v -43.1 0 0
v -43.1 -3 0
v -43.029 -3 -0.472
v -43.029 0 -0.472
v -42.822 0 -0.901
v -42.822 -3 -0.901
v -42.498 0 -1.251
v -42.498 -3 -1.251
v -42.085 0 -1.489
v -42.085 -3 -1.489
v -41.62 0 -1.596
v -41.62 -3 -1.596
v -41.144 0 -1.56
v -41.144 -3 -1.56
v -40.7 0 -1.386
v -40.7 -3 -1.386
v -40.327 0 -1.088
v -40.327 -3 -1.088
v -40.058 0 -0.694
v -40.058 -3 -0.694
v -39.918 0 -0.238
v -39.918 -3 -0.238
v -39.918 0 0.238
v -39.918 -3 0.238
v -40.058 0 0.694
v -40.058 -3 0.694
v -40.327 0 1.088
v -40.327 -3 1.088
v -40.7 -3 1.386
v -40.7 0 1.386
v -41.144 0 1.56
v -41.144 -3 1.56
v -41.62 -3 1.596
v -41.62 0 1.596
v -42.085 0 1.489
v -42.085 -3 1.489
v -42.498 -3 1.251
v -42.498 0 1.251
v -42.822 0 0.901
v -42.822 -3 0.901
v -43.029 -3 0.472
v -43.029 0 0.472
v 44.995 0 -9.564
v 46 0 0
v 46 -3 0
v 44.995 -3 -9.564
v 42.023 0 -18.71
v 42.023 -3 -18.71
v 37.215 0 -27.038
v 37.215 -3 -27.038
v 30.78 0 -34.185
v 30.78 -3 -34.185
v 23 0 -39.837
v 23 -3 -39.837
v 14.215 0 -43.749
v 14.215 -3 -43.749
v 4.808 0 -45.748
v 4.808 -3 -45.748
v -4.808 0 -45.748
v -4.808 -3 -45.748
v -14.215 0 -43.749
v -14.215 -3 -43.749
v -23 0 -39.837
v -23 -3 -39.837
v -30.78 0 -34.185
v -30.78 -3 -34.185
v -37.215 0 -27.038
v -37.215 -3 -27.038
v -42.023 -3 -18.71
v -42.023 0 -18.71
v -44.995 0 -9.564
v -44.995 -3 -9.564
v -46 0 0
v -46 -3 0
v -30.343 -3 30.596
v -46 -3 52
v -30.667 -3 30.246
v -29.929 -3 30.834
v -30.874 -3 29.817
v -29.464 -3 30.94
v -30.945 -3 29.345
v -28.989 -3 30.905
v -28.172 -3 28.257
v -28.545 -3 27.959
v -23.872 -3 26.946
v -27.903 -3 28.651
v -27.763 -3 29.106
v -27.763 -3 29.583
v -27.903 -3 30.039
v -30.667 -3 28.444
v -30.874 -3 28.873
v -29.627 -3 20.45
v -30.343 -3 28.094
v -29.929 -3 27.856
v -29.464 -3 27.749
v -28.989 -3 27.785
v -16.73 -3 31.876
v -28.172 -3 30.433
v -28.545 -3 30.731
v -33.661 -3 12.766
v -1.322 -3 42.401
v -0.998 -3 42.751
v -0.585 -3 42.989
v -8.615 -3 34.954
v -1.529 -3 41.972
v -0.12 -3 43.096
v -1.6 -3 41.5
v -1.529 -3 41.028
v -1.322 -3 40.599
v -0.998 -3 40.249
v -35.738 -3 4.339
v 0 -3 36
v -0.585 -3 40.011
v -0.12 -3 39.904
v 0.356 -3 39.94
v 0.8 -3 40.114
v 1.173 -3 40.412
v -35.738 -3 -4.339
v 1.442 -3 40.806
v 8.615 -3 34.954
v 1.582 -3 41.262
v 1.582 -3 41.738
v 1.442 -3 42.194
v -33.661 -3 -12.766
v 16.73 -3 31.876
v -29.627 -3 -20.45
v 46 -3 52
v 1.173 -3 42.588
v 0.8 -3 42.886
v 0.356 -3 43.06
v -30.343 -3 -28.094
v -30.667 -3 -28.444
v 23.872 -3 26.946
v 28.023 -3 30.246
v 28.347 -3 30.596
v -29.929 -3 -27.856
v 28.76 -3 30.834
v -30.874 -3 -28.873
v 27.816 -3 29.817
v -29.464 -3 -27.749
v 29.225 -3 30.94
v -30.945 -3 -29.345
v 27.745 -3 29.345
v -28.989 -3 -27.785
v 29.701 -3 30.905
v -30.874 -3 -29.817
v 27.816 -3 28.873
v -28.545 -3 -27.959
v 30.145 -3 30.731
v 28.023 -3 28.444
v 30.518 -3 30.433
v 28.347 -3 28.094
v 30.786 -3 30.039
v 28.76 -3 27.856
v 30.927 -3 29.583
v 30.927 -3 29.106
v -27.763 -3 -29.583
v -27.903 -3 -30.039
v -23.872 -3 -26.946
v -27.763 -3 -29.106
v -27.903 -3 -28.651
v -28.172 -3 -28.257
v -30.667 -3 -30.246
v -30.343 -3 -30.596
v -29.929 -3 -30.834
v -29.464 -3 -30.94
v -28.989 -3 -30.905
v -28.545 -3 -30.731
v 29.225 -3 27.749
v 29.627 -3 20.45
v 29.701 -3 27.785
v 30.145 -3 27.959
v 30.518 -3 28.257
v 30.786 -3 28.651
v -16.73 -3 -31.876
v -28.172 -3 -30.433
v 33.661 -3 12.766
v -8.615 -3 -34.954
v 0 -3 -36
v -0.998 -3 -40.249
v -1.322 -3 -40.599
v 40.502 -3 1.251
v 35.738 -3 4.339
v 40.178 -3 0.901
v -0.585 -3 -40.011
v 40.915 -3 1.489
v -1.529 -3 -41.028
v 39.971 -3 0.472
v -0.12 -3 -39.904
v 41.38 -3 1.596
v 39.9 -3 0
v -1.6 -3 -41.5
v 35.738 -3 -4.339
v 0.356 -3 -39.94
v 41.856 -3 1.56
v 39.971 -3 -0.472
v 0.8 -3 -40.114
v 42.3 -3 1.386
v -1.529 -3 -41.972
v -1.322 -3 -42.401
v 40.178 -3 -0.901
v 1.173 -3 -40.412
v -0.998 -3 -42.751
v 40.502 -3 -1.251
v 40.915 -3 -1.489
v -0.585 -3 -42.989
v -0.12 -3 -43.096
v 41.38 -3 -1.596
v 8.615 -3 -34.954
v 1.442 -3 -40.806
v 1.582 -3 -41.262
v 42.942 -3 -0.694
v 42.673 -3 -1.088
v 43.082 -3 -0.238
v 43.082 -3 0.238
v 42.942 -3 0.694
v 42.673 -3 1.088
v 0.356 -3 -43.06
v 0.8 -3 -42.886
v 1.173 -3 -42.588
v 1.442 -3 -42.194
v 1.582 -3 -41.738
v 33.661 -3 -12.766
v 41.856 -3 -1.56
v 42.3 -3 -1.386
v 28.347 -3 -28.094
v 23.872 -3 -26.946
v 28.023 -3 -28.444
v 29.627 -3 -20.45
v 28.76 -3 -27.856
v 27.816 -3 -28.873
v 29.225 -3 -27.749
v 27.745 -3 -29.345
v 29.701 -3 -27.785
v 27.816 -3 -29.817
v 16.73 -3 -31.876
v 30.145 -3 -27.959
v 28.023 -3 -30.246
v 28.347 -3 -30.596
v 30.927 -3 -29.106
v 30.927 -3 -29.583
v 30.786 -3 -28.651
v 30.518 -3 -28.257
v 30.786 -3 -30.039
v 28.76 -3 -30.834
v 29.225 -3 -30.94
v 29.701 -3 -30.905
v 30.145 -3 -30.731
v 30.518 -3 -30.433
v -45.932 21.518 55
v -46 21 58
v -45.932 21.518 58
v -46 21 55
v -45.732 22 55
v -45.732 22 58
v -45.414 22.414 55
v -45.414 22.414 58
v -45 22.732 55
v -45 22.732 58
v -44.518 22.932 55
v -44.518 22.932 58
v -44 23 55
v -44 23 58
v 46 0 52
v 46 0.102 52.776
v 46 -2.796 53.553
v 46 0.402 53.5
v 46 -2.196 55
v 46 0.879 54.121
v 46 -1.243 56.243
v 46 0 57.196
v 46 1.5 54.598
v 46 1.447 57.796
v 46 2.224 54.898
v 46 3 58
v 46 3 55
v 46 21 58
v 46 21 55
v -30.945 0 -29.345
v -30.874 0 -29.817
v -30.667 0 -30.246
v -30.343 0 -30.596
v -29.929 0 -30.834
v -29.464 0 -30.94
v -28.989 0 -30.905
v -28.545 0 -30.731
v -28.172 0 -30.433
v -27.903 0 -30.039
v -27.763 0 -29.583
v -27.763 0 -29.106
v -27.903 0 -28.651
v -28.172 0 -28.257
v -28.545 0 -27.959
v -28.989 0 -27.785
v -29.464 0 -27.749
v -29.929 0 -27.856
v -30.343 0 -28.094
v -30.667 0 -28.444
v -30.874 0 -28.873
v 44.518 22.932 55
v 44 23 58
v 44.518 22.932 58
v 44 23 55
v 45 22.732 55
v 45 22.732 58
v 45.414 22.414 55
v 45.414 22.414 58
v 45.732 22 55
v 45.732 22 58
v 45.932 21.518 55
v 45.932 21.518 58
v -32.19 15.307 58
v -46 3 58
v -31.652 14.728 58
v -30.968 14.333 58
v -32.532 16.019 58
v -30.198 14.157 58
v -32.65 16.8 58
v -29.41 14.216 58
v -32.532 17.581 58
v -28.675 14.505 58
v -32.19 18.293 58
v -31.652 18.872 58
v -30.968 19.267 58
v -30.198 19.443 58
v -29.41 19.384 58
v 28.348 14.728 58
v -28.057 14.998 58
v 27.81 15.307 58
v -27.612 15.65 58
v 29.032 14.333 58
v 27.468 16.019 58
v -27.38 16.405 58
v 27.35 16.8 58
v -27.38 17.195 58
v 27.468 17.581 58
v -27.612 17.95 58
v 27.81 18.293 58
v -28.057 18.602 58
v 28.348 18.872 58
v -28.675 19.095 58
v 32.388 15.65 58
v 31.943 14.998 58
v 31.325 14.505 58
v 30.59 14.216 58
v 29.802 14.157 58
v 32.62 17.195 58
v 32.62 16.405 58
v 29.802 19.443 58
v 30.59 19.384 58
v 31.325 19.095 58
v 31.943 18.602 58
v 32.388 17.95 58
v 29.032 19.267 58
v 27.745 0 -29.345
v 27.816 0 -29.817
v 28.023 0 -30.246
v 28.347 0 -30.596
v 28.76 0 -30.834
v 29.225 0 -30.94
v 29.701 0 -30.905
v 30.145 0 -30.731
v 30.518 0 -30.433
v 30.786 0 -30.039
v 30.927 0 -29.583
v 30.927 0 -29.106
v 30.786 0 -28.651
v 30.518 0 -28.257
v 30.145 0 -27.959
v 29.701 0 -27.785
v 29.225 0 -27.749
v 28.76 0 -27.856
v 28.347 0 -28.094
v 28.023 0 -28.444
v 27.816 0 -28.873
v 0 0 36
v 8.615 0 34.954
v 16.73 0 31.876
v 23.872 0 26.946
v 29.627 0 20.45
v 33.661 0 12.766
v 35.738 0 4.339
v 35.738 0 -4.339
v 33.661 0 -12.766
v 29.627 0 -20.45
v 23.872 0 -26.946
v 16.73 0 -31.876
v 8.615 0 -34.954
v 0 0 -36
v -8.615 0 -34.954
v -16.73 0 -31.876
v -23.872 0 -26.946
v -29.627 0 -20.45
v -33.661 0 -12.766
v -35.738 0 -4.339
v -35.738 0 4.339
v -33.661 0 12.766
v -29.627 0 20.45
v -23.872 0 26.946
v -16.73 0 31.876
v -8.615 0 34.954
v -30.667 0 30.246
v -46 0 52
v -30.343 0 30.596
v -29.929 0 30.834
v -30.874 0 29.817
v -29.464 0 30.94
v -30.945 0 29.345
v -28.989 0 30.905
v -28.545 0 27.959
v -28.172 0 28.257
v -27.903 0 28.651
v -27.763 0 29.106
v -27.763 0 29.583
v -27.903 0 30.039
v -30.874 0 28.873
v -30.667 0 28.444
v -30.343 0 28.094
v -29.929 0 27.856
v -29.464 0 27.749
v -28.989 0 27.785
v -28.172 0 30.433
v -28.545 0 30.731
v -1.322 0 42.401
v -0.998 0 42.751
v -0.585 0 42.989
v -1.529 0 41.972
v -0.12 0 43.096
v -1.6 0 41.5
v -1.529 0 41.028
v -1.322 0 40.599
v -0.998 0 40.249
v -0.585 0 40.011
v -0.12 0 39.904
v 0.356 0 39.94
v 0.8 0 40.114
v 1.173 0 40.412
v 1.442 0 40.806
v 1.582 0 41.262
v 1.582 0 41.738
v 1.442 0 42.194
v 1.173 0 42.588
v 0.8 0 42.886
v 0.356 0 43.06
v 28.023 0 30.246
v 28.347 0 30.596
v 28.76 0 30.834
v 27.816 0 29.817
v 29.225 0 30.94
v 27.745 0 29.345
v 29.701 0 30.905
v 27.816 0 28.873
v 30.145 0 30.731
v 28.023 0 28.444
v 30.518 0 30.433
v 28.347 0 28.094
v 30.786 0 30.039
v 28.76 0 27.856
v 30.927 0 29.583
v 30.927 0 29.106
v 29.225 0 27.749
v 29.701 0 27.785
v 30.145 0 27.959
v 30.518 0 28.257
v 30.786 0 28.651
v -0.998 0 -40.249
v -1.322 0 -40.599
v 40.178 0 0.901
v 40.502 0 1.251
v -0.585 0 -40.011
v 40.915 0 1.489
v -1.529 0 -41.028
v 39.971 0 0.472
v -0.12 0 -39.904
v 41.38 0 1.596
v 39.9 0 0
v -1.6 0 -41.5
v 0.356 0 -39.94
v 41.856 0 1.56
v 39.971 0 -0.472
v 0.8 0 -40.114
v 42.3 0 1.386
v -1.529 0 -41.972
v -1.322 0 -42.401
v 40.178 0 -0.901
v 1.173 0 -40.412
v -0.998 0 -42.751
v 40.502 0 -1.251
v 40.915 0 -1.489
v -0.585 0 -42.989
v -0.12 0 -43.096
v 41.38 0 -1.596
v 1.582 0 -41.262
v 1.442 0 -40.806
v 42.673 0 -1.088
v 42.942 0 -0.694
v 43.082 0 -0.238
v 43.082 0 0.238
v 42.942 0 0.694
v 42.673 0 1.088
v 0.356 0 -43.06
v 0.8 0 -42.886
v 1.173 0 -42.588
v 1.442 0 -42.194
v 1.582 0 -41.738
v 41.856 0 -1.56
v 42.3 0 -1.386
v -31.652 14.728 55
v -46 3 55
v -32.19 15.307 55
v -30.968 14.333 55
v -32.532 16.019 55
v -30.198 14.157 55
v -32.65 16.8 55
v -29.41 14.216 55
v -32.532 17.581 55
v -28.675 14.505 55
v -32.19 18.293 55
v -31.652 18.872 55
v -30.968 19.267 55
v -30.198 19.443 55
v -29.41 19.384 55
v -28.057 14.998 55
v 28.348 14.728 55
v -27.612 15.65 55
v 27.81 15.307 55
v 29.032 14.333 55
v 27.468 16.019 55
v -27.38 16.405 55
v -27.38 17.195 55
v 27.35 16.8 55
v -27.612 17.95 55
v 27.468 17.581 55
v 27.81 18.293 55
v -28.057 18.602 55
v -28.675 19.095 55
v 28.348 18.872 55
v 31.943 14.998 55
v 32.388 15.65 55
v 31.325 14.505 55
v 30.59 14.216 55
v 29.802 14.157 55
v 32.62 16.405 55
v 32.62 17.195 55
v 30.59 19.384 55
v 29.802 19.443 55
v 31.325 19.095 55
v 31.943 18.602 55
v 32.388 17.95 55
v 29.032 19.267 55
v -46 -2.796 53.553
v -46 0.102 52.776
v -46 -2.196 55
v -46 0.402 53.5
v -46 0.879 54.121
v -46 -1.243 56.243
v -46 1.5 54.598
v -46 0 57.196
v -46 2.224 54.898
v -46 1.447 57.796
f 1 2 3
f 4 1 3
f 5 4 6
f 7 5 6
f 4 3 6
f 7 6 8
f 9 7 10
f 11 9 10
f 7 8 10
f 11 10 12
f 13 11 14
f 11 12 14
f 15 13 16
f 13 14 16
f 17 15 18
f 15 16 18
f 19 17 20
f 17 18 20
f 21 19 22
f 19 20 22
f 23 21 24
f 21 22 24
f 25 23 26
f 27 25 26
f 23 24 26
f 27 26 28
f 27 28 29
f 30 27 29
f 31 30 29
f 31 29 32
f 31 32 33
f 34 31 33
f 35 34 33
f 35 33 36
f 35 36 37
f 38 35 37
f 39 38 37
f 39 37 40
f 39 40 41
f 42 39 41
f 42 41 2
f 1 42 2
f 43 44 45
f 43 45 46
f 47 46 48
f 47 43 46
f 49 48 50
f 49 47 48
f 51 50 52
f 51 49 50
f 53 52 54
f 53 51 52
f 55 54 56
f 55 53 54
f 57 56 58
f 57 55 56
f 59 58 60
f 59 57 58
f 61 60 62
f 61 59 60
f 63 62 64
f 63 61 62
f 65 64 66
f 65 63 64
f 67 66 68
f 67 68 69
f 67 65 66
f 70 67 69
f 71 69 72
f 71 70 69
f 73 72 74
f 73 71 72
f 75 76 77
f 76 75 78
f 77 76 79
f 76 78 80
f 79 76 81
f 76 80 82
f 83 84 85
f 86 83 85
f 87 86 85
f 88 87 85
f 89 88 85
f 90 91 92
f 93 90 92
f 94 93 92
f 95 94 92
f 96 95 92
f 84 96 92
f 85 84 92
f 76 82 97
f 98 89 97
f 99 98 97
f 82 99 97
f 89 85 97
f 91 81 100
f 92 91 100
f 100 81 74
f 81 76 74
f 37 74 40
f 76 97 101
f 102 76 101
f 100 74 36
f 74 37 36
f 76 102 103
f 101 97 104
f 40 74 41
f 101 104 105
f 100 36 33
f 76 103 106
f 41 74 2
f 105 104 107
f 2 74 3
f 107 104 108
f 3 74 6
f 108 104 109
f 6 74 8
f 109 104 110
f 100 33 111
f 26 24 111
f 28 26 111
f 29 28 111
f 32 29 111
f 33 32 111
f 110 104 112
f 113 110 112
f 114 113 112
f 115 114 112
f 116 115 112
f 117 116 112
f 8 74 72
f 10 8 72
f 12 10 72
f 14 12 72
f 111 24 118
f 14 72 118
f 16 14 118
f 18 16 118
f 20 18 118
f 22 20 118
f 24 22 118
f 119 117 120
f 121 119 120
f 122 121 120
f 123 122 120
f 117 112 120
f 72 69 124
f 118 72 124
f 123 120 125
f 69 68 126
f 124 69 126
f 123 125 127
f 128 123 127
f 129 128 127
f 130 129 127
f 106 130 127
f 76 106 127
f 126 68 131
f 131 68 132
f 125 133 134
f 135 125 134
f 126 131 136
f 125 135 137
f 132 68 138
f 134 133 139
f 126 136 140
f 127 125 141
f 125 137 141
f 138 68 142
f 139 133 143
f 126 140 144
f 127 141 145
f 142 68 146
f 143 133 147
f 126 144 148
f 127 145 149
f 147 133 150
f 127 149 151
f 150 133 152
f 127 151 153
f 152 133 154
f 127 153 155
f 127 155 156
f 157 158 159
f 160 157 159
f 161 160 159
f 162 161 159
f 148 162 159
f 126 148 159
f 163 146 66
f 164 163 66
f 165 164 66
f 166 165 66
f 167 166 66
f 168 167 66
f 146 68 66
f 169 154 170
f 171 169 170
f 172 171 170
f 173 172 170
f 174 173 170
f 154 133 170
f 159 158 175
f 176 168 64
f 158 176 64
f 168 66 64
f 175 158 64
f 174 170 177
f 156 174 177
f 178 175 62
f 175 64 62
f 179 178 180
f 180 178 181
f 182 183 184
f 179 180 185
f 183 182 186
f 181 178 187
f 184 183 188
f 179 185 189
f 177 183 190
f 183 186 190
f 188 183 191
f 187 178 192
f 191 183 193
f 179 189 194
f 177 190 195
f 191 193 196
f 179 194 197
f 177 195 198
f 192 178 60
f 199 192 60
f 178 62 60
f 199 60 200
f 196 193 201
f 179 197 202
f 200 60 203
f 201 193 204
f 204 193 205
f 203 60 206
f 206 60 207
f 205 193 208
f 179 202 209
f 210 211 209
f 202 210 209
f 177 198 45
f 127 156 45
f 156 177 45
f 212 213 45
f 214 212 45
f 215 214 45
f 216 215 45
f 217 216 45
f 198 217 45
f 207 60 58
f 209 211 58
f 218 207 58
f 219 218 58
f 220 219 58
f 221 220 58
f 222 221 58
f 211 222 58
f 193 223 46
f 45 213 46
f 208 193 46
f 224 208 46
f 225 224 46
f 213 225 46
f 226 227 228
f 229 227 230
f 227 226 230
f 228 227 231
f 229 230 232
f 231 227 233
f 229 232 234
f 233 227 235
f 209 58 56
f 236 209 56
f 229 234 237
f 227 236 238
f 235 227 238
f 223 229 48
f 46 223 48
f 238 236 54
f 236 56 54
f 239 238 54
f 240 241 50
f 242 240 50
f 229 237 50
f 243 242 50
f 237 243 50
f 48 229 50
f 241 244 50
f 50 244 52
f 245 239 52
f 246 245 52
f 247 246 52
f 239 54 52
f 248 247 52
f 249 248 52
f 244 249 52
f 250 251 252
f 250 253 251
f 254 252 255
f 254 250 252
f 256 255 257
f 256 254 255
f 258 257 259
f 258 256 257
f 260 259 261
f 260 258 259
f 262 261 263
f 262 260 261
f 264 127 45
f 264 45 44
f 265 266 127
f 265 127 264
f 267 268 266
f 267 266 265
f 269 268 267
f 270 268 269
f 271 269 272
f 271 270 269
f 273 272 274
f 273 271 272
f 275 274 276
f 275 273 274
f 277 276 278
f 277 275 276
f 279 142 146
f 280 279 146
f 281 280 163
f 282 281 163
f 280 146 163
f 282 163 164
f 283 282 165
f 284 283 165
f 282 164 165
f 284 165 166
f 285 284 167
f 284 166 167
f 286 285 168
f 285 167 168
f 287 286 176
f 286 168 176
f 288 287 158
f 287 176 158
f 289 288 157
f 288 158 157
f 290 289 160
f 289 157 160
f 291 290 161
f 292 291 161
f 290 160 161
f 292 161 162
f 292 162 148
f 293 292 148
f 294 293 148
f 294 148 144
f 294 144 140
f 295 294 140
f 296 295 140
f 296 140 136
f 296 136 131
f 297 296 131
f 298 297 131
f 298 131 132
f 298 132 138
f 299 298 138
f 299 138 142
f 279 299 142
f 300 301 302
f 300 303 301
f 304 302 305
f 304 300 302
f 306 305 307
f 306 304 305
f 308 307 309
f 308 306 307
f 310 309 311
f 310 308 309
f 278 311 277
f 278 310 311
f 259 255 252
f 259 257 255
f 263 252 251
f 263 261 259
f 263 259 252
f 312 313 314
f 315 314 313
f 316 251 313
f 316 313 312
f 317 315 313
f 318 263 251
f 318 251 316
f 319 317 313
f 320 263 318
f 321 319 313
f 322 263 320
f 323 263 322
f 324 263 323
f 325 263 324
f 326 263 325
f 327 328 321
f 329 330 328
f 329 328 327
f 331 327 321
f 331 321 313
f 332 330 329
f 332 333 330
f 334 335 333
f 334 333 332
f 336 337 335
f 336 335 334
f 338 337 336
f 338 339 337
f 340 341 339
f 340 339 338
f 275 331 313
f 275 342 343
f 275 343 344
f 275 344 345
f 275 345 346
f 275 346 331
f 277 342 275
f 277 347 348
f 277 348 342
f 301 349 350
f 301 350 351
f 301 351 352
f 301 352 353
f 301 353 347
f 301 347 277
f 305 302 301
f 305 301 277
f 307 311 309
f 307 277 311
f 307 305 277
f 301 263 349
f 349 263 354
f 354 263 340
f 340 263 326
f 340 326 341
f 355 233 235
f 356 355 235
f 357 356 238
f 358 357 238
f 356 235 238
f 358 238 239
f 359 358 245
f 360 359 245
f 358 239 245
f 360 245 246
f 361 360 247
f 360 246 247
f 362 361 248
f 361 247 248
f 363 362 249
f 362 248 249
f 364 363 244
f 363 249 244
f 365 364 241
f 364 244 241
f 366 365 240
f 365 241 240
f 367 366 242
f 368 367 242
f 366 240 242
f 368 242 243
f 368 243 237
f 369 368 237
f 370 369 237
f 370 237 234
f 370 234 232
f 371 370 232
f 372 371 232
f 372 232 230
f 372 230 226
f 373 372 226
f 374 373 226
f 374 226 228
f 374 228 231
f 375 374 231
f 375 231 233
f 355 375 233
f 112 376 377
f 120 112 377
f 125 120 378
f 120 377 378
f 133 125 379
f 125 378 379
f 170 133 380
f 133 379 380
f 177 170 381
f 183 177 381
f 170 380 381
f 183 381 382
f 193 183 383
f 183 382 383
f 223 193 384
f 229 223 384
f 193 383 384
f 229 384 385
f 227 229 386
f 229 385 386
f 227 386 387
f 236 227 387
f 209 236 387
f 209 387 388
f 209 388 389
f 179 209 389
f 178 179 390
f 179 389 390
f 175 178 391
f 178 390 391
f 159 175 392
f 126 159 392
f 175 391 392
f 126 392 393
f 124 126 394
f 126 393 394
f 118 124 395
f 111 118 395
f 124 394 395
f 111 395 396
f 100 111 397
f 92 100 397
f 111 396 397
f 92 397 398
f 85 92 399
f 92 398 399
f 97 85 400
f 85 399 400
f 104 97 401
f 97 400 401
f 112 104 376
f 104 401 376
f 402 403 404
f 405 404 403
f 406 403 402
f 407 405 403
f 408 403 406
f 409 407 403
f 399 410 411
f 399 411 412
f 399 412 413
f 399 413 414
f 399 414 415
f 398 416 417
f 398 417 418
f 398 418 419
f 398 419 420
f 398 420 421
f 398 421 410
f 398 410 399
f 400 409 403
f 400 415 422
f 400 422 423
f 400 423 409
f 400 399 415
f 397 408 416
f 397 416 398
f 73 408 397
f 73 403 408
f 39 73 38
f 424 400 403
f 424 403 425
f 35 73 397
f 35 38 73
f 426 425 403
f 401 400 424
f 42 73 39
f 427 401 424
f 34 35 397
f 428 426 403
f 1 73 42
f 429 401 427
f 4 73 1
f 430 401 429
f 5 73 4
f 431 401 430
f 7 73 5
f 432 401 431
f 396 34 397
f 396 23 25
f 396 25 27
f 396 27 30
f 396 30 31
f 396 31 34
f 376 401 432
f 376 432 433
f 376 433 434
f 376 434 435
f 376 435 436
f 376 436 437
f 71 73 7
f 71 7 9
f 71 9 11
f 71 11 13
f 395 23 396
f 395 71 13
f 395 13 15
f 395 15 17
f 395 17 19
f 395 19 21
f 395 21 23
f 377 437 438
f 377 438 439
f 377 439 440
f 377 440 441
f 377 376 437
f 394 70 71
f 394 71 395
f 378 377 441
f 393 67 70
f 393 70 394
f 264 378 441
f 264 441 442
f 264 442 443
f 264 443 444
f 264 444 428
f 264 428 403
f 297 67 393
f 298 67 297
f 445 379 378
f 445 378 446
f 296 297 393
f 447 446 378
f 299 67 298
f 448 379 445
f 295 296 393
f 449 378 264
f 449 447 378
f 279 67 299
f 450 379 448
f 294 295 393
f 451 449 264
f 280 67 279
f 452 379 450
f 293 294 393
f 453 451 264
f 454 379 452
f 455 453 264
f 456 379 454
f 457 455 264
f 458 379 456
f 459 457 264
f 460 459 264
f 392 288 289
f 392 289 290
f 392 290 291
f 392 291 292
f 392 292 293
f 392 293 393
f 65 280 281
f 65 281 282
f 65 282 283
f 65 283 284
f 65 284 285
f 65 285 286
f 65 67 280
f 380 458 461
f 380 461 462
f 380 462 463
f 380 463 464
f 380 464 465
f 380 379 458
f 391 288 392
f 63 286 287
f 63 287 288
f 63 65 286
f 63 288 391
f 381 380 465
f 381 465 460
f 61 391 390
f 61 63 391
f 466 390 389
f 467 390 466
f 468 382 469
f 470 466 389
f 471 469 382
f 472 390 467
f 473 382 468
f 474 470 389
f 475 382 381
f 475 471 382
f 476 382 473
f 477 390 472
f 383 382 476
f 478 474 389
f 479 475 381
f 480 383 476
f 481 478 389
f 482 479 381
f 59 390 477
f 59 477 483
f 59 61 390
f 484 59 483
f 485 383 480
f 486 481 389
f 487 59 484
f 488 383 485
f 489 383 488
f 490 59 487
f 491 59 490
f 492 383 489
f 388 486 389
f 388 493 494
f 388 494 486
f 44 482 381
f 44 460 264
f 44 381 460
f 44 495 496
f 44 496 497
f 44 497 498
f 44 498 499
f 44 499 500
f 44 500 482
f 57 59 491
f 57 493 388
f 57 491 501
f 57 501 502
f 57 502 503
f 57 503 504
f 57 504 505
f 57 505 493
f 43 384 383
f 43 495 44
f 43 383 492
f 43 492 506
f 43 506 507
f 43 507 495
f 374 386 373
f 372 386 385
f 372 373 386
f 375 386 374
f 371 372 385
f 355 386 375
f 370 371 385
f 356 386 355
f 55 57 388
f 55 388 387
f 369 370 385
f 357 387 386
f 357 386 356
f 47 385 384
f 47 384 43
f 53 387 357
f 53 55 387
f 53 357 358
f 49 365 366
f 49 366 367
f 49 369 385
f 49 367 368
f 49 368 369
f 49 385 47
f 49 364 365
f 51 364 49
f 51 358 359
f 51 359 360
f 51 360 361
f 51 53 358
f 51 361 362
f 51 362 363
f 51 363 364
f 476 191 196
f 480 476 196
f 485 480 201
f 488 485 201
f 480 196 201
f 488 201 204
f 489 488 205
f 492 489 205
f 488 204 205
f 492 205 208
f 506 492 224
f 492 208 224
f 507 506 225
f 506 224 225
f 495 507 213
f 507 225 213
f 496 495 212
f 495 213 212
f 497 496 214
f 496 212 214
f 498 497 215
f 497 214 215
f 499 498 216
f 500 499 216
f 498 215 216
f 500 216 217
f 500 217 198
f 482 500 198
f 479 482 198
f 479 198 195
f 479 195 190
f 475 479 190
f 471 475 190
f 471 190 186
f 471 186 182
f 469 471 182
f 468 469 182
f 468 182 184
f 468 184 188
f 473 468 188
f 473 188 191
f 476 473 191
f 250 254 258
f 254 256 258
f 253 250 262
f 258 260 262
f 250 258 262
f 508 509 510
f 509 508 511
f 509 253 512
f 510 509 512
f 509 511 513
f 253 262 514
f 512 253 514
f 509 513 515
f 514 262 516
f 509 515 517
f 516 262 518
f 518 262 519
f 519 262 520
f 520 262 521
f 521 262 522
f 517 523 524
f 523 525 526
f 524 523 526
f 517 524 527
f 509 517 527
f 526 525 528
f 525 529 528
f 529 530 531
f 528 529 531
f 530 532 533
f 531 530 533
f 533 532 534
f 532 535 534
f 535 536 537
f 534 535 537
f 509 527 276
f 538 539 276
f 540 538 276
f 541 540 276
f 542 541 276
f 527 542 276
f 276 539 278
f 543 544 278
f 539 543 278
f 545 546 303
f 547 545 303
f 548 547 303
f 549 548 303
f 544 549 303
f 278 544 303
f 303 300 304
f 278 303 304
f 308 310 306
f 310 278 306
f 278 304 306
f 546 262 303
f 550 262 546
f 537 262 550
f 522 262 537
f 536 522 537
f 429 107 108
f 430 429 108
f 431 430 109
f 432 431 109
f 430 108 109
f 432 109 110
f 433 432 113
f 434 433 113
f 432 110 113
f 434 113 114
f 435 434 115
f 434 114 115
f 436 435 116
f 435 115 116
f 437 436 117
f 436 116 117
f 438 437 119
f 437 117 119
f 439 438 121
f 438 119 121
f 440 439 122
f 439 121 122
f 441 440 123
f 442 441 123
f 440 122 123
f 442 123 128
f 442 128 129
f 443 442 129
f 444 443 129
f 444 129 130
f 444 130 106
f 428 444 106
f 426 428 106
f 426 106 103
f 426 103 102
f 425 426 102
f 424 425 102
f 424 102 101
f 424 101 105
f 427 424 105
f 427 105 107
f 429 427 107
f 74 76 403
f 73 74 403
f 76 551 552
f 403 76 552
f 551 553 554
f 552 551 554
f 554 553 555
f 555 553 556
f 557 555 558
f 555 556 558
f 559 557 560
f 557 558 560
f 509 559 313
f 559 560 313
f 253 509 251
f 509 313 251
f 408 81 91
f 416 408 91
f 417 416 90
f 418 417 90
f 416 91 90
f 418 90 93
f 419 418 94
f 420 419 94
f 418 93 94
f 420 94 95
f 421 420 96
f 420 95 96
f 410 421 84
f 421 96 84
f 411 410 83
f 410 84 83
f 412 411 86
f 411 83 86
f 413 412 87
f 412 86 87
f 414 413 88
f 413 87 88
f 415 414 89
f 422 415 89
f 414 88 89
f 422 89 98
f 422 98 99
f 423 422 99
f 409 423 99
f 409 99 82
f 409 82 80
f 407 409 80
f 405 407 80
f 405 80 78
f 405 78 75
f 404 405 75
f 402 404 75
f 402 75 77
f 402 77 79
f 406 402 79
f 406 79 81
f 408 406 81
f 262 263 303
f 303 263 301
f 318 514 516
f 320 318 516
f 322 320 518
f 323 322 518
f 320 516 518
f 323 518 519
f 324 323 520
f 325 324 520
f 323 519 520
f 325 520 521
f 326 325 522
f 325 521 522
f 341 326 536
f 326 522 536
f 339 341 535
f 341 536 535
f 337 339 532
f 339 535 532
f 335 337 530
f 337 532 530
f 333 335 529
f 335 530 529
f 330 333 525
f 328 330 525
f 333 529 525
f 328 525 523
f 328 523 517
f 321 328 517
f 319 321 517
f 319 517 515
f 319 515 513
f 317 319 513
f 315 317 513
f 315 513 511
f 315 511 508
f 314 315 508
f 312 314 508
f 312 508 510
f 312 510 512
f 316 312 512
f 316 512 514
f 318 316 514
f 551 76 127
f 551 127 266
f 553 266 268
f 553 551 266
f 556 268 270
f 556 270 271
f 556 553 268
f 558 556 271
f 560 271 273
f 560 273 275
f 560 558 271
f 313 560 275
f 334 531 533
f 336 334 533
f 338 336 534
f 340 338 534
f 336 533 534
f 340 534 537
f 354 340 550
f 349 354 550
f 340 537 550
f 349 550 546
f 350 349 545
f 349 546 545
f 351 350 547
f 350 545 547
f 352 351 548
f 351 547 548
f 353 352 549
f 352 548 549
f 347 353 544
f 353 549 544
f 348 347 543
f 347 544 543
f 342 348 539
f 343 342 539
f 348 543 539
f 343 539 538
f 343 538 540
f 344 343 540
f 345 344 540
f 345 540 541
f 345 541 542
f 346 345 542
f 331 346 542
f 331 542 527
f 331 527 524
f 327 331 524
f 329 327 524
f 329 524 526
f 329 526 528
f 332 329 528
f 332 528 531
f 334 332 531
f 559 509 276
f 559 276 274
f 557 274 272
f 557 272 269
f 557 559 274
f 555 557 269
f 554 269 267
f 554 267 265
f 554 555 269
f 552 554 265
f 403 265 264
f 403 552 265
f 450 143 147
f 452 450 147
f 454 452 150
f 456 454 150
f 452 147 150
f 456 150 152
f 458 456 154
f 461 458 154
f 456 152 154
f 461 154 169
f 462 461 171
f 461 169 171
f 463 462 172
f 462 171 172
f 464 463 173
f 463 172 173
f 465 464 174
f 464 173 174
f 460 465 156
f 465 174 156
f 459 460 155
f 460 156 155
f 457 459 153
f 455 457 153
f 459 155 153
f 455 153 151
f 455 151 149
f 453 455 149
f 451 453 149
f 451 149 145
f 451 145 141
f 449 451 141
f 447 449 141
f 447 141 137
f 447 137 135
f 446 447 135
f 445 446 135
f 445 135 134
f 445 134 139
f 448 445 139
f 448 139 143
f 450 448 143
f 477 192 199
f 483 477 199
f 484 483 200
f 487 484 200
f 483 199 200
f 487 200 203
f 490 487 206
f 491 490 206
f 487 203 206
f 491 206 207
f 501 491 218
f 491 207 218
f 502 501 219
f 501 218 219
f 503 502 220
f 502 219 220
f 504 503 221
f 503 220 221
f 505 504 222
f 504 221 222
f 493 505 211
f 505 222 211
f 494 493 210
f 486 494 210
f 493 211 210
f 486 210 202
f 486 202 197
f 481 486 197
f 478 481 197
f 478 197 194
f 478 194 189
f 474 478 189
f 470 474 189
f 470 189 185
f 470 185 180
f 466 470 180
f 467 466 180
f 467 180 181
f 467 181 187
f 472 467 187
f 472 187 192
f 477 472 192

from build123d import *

# Parameters (mm, degrees)
SKETCH1_R                    = 36
SKETCH1_R_2                  = 1
BASE_FLANGE1_DEPTH           = 3
EDGE_FLANGE1_STRIP_W         = 18
EDGE_FLANGE1_STRIP_H         = 3
EDGE_FLANGE1_STRIP_CUT_DEPTH = 92
EDGE_FLANGE1_DEPTH           = 92
EDGE_FLANGE1_START           = 3
EDGE_FLANGE1_PROFILE_W       = 92
EDGE_FLANGE1_PROFILE_H       = 20
EDGE_FLANGE1_PROFILE_R       = 1
EDGE_FLANGE1_FLAT_DEPTH      = 3
FILLET1_R                    = 2
M3_CLEARANCE_HOLE1_D         = 3.2
M3_CLEARANCE_HOLE1_DEPTH     = 136
M3_CLEARANCE_HOLE1_TIP       = 0.96137699
M5_CLEARANCE_HOLE1_D         = 5.3
M5_CLEARANCE_HOLE1_DEPTH     = 136
M5_CLEARANCE_HOLE1_TIP       = 1.59228064


# Sheet-metal steps are written as plain solids
with BuildPart() as part:
    # Sketch1 → Base-Flange1 (new body)
    with BuildSketch(Plane(origin=(0, 0, 0), x_dir=(1, 0, 0), z_dir=(0, 1, 0))):
        with BuildLine():
            Line((-46, 0), (-46, -55))
            Line((-46, -55), (46, -55))
            Line((46, -55), (46, 0))
            ThreePointArc((46, 0), (0, 46), (-46, 0))
        make_face()
        with Locations(Location((0, 0, 0), (0, 0, 270))):
            Circle(SKETCH1_R, mode=Mode.SUBTRACT)
        with Locations(Location((0, 41.5, 0), (0, 0, 270))):
            Circle(SKETCH1_R_2, mode=Mode.SUBTRACT)
        with Locations(Location((29.344931419, 29.344931419, 0), (0, 0, 270))):
            Circle(SKETCH1_R_2, mode=Mode.SUBTRACT)
        with Locations(Location((41.5, 0, 0), (0, 0, 270))):
            Circle(SKETCH1_R_2, mode=Mode.SUBTRACT)
        with Locations(Location((29.344931419, -29.344931419, 0), (0, 0, 270))):
            Circle(SKETCH1_R_2, mode=Mode.SUBTRACT)
        with Locations(Location((0, -41.5, 0), (0, 0, 270))):
            Circle(SKETCH1_R_2, mode=Mode.SUBTRACT)
        with Locations(Location((-29.344931419, -29.344931419, 0), (0, 0, 270))):
            Circle(SKETCH1_R_2, mode=Mode.SUBTRACT)
        with Locations(Location((-41.5, 0, 0), (0, 0, 270))):
            Circle(SKETCH1_R_2, mode=Mode.SUBTRACT)
        with Locations(Location((-29.344931419, 29.344931419, 0), (0, 0, 270))):
            Circle(SKETCH1_R_2, mode=Mode.SUBTRACT)
    extrude(amount=-BASE_FLANGE1_DEPTH)

    # Edge-Flange1 strip (across the edge) → Edge-Flange1 strip cut (cut)
    with BuildSketch(Plane(origin=(-46, 0, 55), x_dir=(0, 0, -1), z_dir=(1, 0, 0))):
        with Locations((-6, -1.5)):
            Rectangle(EDGE_FLANGE1_STRIP_W, EDGE_FLANGE1_STRIP_H)
    extrude(amount=EDGE_FLANGE1_STRIP_CUT_DEPTH, mode=Mode.SUBTRACT)

    # Edge-Flange1 bend section (across the edge) → Edge-Flange1 (add)
    with BuildSketch(Plane(origin=(-46, 0, 55), x_dir=(0, 0, -1), z_dir=(1, 0, 0))):
        with BuildLine():
            Line((-3, 3), (0, 3))
            ThreePointArc((0, 3), (0.878679656, 0.878679656), (3, 0))
            Line((3, 0), (3, -3))
            ThreePointArc((3, -3), (-1.242640687, -1.242640687), (-3, 3))
        make_face()
    extrude(amount=EDGE_FLANGE1_DEPTH)

    # Edge-Flange1 profile (on flange) → Edge-Flange1 flat (add)
    with BuildSketch(Plane.XY.offset(55).offset(EDGE_FLANGE1_START)):
        with Locations((0, 13)):
            Rectangle(EDGE_FLANGE1_PROFILE_W, EDGE_FLANGE1_PROFILE_H)
        with Locations((-30, 16.8)):
            Circle(EDGE_FLANGE1_PROFILE_R, mode=Mode.SUBTRACT)
        with Locations((30, 16.8)):
            Circle(EDGE_FLANGE1_PROFILE_R, mode=Mode.SUBTRACT)
    extrude(amount=-EDGE_FLANGE1_FLAT_DEPTH)

    # Fillet1
    fillet1_edges = [part.edges().sort_by_distance(p)[0] for p in [
        (-46, 23, 56.5),
        (46, 23, 56.5),
    ]]
    fillet(fillet1_edges, radius=FILLET1_R)

    # M3 Clearance Hole1
    with Locations(Plane(origin=(0, 0, 0), x_dir=(1, 0, 0), z_dir=(0, 1, 0))):
        with Locations((0, 41.5), (29.344931419, 29.344931419), (41.5, 0), (29.344931419, -29.344931419), (0, -41.5), (-29.344931419, -29.344931419), (-41.5, 0), (-29.344931419, 29.344931419)):
            Hole(M3_CLEARANCE_HOLE1_D / 2, depth=M3_CLEARANCE_HOLE1_DEPTH)
            with Locations((0, 0, -(M3_CLEARANCE_HOLE1_DEPTH + M3_CLEARANCE_HOLE1_TIP / 2))):  # 118° drill point
                Cone(0, M3_CLEARANCE_HOLE1_D / 2, M3_CLEARANCE_HOLE1_TIP, mode=Mode.SUBTRACT)

    # M5 Clearance Hole1
    with Locations(Plane.XY.offset(58)):
        with Locations((30, 16.8), (-30, 16.8)):
            Hole(M5_CLEARANCE_HOLE1_D / 2, depth=M5_CLEARANCE_HOLE1_DEPTH)
            with Locations((0, 0, -(M5_CLEARANCE_HOLE1_DEPTH + M5_CLEARANCE_HOLE1_TIP / 2))):  # 118° drill point
                Cone(0, M5_CLEARANCE_HOLE1_D / 2, M5_CLEARANCE_HOLE1_TIP, mode=Mode.SUBTRACT)


solid = part.part
